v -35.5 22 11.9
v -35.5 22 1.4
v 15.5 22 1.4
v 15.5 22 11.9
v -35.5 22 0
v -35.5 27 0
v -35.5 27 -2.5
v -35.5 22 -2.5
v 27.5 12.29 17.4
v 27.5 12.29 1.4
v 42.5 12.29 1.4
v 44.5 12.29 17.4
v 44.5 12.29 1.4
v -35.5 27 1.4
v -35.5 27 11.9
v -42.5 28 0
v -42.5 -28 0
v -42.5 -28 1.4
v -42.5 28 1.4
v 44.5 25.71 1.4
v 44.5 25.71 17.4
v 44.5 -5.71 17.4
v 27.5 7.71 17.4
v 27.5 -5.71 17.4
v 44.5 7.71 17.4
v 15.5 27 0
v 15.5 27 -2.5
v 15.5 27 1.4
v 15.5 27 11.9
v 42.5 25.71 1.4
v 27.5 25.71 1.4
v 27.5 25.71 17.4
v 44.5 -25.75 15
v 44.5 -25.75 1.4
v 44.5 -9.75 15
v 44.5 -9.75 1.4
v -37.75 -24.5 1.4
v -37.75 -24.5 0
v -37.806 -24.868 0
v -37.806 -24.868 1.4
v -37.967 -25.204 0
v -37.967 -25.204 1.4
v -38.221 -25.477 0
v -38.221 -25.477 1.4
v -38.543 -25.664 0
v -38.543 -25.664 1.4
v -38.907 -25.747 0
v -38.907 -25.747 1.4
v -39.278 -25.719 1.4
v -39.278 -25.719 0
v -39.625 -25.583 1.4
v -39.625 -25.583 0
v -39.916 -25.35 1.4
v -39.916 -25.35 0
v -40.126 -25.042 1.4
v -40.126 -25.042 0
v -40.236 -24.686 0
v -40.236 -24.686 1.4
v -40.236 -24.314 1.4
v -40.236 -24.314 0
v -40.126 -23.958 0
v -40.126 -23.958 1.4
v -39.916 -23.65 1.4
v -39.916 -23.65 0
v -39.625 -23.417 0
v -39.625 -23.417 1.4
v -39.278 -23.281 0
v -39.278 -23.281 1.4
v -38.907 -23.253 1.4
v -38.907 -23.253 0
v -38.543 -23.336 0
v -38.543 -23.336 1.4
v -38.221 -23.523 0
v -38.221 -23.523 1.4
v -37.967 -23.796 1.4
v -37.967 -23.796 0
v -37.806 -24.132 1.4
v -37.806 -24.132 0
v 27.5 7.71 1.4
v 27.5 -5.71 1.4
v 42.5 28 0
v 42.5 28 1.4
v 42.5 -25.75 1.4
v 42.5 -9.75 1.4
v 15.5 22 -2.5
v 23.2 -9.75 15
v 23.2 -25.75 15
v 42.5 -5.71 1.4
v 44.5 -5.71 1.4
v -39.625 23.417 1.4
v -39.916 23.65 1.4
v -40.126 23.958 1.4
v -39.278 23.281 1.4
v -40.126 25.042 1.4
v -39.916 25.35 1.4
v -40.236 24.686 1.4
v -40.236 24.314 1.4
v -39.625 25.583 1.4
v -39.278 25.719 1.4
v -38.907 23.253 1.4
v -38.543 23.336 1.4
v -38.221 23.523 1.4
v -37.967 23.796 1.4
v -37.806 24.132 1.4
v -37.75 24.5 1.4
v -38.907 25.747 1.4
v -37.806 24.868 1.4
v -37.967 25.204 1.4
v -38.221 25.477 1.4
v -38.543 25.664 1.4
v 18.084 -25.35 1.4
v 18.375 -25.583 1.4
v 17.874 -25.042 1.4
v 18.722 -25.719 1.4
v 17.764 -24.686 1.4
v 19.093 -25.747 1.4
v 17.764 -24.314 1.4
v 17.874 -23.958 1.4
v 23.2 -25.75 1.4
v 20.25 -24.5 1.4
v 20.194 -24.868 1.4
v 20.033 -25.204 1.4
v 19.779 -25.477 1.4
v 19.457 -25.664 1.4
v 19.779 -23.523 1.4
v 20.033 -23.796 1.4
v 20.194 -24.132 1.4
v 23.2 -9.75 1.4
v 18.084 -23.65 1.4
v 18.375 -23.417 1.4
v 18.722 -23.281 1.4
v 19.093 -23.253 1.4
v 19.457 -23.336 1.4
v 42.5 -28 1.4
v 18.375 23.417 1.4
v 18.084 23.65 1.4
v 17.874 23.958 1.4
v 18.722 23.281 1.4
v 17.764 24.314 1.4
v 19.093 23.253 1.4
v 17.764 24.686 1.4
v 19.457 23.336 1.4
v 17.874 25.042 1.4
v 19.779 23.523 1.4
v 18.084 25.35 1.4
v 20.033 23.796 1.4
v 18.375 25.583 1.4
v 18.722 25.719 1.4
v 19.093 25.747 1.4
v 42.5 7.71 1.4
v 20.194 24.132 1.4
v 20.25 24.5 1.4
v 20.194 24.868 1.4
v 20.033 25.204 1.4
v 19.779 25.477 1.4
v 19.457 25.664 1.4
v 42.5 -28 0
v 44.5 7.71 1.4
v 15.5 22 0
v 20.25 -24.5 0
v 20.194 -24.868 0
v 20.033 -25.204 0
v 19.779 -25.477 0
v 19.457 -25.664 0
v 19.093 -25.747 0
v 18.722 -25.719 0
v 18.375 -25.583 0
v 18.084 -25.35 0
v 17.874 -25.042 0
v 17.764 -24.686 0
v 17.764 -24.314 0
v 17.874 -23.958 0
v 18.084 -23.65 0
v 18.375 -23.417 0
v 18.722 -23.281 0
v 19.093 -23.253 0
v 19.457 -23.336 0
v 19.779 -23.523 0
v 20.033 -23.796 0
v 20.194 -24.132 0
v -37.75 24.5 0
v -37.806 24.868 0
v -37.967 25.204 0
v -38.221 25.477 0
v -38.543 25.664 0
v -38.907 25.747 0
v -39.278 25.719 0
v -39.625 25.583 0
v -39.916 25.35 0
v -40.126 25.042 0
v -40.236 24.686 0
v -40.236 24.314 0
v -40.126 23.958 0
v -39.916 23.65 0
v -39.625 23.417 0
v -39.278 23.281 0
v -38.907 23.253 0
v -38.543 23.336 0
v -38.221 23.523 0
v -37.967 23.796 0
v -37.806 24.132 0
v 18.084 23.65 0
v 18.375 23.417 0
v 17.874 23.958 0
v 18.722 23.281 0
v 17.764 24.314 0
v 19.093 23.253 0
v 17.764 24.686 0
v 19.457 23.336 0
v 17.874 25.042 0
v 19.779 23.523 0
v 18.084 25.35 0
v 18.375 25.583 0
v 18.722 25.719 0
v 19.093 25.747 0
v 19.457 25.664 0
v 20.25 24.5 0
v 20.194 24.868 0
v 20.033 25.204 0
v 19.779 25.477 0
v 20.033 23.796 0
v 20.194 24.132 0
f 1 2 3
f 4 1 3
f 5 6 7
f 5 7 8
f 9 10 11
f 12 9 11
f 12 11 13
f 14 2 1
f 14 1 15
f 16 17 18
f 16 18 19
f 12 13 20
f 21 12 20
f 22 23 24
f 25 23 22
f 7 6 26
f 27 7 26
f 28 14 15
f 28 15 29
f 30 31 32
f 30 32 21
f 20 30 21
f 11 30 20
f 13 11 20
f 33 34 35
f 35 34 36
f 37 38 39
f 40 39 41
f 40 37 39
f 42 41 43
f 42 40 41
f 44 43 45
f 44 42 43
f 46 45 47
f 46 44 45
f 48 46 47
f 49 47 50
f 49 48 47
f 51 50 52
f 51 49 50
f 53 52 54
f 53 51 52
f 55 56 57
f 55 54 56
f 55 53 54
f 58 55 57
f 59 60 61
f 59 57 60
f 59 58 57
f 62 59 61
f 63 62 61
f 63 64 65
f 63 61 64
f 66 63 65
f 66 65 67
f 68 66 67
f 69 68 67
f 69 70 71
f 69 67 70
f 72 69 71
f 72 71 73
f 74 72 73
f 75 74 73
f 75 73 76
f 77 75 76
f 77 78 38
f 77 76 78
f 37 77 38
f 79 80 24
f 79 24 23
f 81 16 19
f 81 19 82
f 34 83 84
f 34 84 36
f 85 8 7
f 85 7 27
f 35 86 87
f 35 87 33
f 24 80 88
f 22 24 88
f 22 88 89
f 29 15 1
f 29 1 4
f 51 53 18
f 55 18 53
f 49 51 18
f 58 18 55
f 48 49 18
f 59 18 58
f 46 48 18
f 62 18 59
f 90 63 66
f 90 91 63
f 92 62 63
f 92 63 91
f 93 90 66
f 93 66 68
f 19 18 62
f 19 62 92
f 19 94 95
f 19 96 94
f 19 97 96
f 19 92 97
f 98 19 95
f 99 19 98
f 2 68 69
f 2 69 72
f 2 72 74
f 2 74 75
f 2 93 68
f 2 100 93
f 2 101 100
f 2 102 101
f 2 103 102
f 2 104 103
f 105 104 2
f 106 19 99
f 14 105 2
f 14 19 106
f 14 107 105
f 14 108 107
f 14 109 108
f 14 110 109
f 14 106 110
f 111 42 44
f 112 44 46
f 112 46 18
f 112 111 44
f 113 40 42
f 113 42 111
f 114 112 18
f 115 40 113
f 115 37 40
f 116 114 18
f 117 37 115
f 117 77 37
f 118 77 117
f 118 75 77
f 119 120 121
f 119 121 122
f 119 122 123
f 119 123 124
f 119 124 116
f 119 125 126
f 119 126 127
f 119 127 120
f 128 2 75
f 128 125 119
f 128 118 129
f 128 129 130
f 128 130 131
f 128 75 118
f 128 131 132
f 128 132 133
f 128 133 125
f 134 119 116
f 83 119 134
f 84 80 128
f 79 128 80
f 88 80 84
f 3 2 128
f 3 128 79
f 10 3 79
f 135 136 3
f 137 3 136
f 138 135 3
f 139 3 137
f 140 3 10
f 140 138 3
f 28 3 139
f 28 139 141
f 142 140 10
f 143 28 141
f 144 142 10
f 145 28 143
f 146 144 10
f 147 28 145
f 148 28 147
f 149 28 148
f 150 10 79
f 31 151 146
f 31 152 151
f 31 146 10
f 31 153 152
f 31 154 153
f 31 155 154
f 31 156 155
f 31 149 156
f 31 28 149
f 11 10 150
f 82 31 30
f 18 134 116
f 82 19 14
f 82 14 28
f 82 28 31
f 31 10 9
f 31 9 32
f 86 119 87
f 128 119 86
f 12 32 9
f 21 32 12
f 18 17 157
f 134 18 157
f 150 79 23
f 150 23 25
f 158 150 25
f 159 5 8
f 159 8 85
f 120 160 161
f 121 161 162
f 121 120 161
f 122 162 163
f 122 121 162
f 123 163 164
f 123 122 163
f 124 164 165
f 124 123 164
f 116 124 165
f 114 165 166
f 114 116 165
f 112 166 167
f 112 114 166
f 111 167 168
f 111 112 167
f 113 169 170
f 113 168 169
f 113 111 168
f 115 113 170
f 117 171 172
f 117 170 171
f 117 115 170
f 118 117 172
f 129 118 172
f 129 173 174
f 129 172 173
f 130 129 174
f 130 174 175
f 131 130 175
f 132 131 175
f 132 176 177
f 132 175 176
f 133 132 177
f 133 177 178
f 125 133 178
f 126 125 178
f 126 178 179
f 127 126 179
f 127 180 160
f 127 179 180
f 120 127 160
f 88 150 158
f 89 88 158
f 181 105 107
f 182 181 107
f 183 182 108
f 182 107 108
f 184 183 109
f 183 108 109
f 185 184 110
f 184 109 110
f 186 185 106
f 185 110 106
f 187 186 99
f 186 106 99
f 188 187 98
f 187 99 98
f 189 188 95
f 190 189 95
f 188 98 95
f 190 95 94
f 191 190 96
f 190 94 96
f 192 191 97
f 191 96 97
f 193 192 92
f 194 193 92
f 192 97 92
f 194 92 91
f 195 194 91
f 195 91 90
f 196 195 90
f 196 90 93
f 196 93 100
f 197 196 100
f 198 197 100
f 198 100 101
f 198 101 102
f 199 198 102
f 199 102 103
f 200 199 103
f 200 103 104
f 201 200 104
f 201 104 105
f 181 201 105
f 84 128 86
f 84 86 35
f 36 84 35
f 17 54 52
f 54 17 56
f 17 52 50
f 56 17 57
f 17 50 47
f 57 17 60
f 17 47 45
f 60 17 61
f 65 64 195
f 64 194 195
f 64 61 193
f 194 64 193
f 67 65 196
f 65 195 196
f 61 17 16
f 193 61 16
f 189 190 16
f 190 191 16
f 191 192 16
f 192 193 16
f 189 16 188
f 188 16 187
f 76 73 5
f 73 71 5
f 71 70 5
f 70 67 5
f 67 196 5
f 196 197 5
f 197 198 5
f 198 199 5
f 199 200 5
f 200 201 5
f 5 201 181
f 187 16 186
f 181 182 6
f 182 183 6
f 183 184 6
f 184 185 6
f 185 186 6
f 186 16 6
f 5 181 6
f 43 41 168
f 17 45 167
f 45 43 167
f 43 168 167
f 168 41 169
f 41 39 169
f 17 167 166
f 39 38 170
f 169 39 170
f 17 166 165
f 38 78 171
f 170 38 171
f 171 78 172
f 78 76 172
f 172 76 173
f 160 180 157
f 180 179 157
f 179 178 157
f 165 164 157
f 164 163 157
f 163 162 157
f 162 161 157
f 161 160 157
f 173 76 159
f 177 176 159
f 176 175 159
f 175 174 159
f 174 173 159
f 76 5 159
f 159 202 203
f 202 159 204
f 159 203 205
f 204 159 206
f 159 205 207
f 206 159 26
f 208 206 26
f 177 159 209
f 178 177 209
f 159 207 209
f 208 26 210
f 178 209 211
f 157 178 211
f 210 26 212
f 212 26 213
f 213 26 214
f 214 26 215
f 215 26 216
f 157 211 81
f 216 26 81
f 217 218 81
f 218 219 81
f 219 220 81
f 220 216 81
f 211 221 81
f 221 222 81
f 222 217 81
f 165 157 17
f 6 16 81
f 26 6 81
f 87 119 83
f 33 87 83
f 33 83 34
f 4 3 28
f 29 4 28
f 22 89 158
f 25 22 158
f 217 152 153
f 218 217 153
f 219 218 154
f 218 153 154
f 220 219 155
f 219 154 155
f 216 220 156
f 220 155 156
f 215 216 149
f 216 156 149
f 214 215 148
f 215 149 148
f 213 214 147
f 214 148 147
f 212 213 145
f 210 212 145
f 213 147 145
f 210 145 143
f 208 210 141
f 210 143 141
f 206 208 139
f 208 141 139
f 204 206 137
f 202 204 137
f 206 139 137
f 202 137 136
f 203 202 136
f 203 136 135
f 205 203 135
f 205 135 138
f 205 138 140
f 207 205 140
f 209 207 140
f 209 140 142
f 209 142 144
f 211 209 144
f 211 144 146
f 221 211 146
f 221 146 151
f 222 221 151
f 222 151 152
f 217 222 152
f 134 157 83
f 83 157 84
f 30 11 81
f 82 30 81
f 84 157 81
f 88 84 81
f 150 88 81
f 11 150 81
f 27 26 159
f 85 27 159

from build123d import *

# Parameters (mm, degrees)
SKETCH_W     = 85
SKETCH_H     = 56
PAD_DEPTH    = 1.4
SKETCH001_R  = 1.25
POCKET_DEPTH = 204.998249
SKETCH002_W  = 17
SKETCH002_H  = 13.42
PAD001_DEPTH = 16
SKETCH003_W  = 21.3
SKETCH003_H  = 16
PAD002_DEPTH = 13.6
SKETCH004_W  = 51
SKETCH004_H  = 5
PAD003_DEPTH = 10.5
SKETCH005_W  = 51
SKETCH005_H  = 5
PAD004_DEPTH = 2.5


with BuildPart() as part:
    # Sketch → Pad (new body)
    with BuildSketch(Plane.XY):
        Rectangle(SKETCH_W, SKETCH_H)
    extrude(amount=PAD_DEPTH)

    # Sketch001 → Pocket (cut, through all)
    with BuildSketch(Plane.XY.offset(1.4)):
        with Locations((-39, 24.5)):
            Circle(SKETCH001_R)
        with Locations((19, 24.5)):
            Circle(SKETCH001_R)
    pocket = extrude(amount=-POCKET_DEPTH, mode=Mode.SUBTRACT)

    # Mirrored: Pocket across Sketch001 H_Axis
    add(pocket.mirror(Plane(origin=(0, 0, 1.4), x_dir=(0, 0, 1), z_dir=(0, 1, 0))), mode=Mode.SUBTRACT)

    # Sketch002 → Pad001 (new body)
    with BuildSketch(Plane.XY.offset(1.4)):
        with Locations((36, 19)):
            Rectangle(SKETCH002_W, SKETCH002_H)
        with Locations((36, 1)):
            Rectangle(SKETCH002_W, SKETCH002_H)
    extrude(amount=PAD001_DEPTH)

    # Sketch003 → Pad002 (new body)
    with BuildSketch(Plane.XY.offset(1.4)):
        with Locations((33.85, -17.75)):
            Rectangle(SKETCH003_W, SKETCH003_H)
    extrude(amount=PAD002_DEPTH)

    # Sketch004 → Pad003 (new body)
    with BuildSketch(Plane.XY.offset(1.4)):
        with Locations((-10, 24.5)):
            Rectangle(SKETCH004_W, SKETCH004_H)
    extrude(amount=PAD003_DEPTH)

    # Sketch005 → Pad004 (new body)
    with BuildSketch(Plane(origin=(0, 0, 0), x_dir=(1, 0, 0), z_dir=(0, 0, -1))):
        with Locations((-10, -24.5)):
            Rectangle(SKETCH005_W, SKETCH005_H)
    extrude(amount=PAD004_DEPTH)


solid = part.part
